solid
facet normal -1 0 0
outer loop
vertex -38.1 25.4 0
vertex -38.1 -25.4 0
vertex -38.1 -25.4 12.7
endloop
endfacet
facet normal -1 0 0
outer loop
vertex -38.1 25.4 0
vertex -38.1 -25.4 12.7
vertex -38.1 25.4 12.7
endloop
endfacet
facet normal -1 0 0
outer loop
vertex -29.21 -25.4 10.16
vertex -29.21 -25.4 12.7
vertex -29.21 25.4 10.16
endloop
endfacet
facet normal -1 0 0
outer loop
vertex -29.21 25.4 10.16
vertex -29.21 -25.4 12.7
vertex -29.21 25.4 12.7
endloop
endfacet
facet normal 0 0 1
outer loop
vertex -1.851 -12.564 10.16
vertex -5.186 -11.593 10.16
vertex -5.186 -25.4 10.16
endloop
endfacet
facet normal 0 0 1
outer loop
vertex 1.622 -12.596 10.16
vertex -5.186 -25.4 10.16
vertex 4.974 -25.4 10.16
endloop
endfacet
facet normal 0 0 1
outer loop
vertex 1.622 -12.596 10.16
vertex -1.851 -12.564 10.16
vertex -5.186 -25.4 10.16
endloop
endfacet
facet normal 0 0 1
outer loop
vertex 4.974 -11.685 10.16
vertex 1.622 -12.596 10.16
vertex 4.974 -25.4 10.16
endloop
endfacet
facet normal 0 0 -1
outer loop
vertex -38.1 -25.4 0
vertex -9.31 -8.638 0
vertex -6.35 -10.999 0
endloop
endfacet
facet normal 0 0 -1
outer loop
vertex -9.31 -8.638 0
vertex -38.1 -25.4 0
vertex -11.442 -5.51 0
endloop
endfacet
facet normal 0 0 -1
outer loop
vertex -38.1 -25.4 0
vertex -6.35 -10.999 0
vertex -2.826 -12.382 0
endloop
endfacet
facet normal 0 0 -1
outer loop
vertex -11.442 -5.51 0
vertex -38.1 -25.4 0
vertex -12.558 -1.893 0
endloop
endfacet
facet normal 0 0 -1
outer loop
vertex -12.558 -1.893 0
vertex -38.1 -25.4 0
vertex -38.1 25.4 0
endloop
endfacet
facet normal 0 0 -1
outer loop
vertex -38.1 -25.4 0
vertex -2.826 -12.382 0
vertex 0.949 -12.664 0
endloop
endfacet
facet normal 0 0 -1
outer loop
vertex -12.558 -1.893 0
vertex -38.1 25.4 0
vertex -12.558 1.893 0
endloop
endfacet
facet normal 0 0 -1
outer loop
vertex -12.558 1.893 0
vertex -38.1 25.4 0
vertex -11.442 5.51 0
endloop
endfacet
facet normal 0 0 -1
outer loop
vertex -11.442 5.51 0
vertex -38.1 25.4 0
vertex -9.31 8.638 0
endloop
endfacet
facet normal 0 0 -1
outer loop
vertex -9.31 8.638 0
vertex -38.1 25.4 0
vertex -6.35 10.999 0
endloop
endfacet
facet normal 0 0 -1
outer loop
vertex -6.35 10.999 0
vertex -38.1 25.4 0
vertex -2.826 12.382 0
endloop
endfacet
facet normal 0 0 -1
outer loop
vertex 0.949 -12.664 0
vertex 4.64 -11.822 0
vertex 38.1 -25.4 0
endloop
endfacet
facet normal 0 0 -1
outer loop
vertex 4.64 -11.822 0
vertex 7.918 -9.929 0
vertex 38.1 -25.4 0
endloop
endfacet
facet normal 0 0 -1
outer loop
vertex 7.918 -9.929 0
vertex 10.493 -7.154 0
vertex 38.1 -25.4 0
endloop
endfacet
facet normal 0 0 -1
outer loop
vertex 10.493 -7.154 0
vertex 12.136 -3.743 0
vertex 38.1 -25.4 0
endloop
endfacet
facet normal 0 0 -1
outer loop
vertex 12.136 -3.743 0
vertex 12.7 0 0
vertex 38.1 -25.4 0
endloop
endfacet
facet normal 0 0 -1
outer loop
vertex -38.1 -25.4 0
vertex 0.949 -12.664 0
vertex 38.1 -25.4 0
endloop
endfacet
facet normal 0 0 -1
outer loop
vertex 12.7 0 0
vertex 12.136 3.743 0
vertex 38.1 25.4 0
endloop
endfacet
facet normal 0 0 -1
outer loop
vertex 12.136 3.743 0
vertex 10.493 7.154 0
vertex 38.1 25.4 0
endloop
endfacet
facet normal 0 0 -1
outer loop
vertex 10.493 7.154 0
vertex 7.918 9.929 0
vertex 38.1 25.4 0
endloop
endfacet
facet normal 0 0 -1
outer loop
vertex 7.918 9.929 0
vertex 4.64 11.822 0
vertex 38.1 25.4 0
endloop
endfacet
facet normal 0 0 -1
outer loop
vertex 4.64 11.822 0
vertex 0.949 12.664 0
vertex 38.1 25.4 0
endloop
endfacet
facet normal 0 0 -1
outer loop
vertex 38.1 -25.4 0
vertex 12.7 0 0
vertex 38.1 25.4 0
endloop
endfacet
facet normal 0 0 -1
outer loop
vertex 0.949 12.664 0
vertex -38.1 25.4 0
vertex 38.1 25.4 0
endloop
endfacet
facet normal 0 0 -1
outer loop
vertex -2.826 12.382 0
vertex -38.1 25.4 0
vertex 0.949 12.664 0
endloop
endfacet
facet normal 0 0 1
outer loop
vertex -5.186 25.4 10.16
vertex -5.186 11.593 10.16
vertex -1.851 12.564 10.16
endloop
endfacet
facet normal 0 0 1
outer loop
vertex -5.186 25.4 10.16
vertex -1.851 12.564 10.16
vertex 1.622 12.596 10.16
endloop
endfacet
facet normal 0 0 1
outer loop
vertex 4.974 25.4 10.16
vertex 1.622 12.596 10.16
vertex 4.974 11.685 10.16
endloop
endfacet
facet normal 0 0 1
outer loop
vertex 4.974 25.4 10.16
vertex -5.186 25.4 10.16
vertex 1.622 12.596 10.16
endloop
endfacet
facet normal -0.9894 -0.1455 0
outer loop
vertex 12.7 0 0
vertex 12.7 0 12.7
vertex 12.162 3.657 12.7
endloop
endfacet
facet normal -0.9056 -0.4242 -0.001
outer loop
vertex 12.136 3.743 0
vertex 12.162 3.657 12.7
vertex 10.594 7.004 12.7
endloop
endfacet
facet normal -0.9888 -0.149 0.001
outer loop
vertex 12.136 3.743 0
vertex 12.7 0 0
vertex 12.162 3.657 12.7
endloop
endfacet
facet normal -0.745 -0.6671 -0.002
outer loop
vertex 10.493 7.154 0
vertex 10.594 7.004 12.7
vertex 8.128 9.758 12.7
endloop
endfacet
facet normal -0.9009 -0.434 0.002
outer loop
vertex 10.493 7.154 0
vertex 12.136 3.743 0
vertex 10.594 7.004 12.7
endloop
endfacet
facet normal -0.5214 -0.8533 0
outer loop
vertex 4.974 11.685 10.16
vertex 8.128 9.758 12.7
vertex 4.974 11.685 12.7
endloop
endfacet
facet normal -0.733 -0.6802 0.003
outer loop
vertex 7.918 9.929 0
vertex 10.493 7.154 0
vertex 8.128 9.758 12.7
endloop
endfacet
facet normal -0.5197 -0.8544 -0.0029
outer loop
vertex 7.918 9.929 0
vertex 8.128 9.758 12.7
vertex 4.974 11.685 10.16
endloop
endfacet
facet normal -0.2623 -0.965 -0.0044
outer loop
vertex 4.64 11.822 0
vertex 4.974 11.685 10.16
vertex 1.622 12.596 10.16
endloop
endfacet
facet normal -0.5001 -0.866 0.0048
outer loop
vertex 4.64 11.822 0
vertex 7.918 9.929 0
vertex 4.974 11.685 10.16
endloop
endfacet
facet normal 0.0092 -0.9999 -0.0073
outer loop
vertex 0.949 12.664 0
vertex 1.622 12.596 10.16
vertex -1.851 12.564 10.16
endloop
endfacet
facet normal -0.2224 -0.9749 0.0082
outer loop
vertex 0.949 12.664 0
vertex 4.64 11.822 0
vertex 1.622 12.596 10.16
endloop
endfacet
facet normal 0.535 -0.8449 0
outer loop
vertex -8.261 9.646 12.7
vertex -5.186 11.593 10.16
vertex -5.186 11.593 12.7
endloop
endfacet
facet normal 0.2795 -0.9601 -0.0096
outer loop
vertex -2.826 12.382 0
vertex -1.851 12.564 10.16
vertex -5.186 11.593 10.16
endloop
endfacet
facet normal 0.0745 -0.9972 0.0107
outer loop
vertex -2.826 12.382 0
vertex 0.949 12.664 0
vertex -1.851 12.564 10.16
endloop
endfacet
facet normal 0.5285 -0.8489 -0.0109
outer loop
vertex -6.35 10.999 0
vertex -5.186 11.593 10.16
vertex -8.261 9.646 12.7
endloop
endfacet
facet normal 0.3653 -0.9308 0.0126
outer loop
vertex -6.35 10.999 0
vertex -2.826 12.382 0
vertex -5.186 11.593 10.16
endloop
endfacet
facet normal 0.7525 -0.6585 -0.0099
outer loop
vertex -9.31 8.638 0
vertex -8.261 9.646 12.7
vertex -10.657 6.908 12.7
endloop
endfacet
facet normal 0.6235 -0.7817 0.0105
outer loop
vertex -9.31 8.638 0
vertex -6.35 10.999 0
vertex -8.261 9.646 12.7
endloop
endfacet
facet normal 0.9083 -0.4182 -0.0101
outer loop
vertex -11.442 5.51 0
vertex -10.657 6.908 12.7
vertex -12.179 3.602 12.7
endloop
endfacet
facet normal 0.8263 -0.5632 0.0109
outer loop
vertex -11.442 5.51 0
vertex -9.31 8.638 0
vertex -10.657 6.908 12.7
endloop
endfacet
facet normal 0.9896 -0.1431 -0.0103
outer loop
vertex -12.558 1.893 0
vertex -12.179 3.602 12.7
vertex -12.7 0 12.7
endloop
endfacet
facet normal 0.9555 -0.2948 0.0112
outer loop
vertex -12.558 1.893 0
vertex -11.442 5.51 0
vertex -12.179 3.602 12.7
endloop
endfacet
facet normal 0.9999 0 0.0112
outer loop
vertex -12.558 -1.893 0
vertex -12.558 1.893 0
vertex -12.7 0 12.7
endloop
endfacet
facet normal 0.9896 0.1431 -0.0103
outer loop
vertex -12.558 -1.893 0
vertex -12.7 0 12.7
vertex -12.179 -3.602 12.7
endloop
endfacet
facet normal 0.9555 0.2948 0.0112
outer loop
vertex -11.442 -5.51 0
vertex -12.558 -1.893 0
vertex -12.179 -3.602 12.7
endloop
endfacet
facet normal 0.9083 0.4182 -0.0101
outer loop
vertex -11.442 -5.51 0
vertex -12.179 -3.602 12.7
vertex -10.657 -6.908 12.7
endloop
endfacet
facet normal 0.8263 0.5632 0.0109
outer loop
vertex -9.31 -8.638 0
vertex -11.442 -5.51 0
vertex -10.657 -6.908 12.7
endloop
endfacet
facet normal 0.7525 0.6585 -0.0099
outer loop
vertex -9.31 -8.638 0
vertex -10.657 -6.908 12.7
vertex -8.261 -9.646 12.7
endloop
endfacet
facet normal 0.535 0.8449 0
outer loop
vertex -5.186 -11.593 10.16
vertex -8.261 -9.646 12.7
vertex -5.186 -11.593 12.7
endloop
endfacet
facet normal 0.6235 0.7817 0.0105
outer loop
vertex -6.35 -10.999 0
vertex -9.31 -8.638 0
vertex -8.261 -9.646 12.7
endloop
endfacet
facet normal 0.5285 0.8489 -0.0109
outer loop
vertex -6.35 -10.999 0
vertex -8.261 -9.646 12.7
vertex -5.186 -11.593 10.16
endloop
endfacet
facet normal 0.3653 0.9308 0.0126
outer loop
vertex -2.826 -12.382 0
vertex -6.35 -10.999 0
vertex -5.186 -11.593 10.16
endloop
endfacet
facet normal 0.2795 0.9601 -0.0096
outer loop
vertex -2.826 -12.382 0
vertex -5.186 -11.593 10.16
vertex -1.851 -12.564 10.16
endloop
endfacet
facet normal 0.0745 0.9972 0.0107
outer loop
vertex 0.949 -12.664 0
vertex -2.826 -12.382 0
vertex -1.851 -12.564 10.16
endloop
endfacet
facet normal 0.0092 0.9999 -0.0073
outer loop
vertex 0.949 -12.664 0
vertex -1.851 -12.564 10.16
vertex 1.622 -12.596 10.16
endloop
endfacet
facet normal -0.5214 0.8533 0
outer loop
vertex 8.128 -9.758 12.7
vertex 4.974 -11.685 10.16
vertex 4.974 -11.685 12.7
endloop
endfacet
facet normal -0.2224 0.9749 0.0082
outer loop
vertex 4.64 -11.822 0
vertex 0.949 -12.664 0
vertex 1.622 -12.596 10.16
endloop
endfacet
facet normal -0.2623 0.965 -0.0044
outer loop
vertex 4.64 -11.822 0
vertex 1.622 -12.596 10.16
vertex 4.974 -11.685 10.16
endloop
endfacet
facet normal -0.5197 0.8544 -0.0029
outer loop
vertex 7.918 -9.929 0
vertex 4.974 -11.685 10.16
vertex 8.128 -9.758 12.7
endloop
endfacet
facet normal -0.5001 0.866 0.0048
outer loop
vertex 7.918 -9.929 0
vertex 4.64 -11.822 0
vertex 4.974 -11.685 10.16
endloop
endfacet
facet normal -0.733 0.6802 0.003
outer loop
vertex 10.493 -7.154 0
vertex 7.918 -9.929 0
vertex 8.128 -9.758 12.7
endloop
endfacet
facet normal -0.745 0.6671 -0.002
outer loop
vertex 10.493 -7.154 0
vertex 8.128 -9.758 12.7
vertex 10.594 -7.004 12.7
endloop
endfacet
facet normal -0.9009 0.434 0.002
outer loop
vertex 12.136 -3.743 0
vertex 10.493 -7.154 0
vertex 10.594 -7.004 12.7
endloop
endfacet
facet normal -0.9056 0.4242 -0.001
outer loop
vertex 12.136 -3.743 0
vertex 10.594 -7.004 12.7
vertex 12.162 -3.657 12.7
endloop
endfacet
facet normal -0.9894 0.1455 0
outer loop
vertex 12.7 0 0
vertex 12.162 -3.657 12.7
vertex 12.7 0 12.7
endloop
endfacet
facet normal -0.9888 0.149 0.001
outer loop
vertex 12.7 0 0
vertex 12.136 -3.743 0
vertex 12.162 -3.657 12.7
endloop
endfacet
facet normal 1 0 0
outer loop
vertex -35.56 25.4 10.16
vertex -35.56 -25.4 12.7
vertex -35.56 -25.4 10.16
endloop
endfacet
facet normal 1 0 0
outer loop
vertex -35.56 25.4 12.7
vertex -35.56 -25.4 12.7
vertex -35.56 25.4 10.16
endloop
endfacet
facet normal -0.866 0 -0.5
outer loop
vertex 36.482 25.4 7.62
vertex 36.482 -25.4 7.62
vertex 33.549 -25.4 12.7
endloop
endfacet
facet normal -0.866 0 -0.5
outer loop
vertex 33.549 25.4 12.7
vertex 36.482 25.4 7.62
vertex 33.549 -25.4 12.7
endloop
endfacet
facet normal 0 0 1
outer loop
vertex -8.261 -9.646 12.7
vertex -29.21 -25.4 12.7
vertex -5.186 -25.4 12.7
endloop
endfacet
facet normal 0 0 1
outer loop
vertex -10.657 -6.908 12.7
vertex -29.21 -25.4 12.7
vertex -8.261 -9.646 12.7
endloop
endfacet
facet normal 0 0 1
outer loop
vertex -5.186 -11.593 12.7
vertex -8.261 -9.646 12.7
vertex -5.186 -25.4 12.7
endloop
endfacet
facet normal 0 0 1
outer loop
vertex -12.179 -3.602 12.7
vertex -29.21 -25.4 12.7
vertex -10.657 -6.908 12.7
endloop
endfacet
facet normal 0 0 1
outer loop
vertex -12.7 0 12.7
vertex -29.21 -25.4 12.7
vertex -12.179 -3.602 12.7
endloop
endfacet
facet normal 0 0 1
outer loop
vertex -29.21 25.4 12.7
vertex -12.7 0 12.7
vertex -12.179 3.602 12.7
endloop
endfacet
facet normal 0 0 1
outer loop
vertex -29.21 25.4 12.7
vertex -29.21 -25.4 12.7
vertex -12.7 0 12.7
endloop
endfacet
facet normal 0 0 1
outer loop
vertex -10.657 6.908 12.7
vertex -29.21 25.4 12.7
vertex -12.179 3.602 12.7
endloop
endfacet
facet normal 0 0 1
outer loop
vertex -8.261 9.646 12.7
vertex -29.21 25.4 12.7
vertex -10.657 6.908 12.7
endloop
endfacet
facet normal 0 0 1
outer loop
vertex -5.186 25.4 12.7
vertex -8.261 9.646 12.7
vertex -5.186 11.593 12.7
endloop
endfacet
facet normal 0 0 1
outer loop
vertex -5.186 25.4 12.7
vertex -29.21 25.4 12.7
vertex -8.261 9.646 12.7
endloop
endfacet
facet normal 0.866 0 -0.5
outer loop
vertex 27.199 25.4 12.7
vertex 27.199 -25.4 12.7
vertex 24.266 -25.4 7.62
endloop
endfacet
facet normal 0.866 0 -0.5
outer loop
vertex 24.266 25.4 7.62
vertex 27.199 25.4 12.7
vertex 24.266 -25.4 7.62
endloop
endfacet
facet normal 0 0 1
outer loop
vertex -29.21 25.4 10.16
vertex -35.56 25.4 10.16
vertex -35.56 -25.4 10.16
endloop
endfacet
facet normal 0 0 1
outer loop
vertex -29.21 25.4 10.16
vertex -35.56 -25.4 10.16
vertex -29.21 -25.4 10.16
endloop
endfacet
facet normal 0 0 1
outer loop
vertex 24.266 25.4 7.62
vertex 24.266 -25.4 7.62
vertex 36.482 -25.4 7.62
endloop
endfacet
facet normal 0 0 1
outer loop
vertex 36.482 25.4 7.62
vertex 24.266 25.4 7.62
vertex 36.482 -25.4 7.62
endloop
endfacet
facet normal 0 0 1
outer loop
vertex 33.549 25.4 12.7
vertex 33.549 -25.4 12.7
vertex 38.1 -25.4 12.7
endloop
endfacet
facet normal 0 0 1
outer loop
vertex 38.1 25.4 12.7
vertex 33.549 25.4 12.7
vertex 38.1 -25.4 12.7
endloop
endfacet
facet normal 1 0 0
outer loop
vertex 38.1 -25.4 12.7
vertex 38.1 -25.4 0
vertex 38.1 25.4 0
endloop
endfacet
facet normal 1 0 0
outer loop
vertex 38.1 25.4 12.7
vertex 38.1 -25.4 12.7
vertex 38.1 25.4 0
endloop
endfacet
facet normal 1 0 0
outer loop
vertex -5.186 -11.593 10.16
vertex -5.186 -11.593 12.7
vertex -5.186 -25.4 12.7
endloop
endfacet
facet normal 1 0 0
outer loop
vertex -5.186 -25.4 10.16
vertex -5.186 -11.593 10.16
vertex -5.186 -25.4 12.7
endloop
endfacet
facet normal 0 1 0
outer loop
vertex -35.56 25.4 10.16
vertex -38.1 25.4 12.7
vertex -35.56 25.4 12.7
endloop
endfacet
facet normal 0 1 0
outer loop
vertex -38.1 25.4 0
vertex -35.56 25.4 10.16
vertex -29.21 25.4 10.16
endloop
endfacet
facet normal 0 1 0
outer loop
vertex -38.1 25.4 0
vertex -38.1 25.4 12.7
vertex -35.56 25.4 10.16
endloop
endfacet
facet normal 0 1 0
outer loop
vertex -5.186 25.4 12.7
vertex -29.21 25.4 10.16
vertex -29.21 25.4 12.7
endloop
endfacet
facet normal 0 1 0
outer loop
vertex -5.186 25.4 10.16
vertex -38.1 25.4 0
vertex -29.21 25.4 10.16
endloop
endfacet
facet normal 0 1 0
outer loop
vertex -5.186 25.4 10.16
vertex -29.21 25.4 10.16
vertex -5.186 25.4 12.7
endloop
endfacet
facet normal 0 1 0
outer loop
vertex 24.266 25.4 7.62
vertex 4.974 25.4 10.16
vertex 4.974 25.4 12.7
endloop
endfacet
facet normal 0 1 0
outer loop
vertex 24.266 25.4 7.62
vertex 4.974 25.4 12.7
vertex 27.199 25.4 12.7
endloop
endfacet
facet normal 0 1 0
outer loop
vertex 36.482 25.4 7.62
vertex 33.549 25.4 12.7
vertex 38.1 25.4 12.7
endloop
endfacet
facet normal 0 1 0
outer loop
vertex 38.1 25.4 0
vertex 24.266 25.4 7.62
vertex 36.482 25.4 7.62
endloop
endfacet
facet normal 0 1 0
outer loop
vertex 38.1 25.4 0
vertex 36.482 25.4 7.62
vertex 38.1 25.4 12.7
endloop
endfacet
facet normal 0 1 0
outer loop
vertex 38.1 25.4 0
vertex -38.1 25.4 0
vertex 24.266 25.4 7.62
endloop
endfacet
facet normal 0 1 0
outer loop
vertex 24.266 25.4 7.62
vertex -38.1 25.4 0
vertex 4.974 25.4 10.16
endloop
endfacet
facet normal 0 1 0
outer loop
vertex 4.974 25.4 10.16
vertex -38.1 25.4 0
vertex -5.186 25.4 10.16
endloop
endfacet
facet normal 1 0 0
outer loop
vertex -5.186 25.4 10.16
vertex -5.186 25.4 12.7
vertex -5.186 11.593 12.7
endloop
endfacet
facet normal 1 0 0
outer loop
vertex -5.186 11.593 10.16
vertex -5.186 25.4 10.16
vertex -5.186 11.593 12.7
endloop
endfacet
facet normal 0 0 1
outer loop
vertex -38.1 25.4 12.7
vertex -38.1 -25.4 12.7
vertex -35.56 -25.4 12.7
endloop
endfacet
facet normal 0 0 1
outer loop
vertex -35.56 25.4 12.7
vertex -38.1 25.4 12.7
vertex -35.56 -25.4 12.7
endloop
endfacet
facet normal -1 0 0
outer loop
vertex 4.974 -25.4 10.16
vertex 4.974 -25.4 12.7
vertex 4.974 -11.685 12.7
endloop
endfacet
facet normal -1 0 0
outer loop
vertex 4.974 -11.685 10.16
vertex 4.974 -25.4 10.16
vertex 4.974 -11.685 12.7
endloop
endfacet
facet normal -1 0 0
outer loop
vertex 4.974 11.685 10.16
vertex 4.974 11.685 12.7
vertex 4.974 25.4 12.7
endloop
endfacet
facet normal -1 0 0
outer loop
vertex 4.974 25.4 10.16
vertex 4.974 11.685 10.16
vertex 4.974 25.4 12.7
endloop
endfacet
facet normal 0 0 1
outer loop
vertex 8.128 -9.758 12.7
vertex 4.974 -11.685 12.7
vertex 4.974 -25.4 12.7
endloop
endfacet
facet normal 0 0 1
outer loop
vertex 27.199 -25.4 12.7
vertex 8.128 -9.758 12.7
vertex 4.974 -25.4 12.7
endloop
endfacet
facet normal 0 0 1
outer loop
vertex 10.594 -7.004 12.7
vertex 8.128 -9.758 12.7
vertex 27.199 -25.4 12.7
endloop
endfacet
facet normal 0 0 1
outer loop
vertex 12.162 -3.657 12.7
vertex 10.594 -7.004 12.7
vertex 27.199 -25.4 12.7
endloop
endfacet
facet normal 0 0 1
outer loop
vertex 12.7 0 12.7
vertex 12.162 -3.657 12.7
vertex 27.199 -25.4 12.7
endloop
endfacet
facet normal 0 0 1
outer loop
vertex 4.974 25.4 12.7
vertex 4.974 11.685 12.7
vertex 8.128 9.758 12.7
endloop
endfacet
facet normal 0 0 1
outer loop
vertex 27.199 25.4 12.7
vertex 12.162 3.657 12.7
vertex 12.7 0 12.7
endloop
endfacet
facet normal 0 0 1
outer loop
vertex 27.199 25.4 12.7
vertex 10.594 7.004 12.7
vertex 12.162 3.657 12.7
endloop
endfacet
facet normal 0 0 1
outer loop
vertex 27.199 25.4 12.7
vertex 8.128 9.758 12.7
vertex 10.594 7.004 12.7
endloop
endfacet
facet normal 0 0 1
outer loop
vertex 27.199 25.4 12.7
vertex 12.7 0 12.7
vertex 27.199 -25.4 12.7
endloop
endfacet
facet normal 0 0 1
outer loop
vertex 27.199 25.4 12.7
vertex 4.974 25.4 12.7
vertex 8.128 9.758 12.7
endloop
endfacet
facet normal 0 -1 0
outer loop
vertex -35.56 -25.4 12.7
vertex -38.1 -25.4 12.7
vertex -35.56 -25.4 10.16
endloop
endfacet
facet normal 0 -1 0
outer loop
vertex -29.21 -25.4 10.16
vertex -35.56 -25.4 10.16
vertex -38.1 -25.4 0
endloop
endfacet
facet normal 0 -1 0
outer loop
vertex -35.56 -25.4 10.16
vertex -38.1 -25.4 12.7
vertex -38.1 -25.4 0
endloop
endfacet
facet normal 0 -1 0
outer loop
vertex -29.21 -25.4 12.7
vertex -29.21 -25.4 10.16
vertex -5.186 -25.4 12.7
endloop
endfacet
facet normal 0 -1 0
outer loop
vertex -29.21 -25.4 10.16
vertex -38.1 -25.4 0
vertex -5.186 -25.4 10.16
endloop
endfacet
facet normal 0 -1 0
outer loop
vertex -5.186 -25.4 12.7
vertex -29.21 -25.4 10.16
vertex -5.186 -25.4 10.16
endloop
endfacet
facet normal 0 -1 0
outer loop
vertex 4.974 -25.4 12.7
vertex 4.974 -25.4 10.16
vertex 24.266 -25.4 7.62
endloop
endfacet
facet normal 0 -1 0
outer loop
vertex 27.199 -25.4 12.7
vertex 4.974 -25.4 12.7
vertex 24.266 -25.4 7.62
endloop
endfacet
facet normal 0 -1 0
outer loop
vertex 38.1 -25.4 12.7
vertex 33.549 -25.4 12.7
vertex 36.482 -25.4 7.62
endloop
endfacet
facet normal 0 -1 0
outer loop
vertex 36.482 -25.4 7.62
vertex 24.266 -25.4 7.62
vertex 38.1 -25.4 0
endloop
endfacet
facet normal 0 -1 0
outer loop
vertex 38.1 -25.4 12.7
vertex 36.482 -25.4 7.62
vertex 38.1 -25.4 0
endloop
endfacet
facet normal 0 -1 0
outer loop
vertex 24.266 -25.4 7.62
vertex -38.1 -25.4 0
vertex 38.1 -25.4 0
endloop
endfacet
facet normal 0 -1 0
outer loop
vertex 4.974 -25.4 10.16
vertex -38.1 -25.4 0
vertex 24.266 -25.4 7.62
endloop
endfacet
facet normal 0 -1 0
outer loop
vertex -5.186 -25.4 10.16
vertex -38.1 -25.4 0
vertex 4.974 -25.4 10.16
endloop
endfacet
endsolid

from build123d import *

# Parameters (mm, degrees)
F0_W     = 76.2
F0_H     = 50.8
F0_R     = 12.7
F1_DEPTH = 12.7
F2_W     = 6.35
F2_H     = 50.8
F3_DEPTH = 2.54
F5_DEPTH = 50.8


with BuildPart() as f1:
    # F0 (on Top) → F1 (new body)
    with BuildSketch(Plane.XY):
        Rectangle(F0_W, F0_H)
        Circle(F0_R, mode=Mode.SUBTRACT)
    extrude(amount=F1_DEPTH)

    # F2 (on face) → F3 (cut)
    with BuildSketch(Plane.XY.offset(12.7)):
        with BuildLine():
            Line((-5.1856809296, -11.5930459025), (-5.1856809296, -25.4))
            Line((-5.1856809296, -25.4), (4.9743190704, -25.4))
            Line((4.9743190704, -25.4), (4.9743190704, -11.6852963071))
            ThreePointArc((4.9743190704, -11.6852963071), (-0.1153082528, -12.6994765249), (-5.1856809296, -11.5930459025))
        make_face()
        with BuildLine():
            Line((4.9743190704, 25.4), (-5.1856809296, 25.4))
            Line((-5.1856809296, 25.4), (-5.1856809296, 11.5930459025))
            ThreePointArc((-5.1856809296, 11.5930459025), (-0.1153082528, 12.6994765249), (4.9743190704, 11.6852963071))
            Line((4.9743190704, 11.6852963071), (4.9743190704, 25.4))
        make_face()
        with Locations((-32.385, 0)):
            Rectangle(F2_W, F2_H)
    extrude(amount=-F3_DEPTH, mode=Mode.SUBTRACT)

    # F4 (on face) → F5 (cut, through all)
    with BuildSketch(Plane.XZ.offset(25.4)):
        Polygon((33.5493190704, 12.7), (27.1993190704, 12.7), (24.2663797029, 7.62), (36.4822584379, 7.62), align=None)
    extrude(amount=-F5_DEPTH, mode=Mode.SUBTRACT)


solid = f1.part
